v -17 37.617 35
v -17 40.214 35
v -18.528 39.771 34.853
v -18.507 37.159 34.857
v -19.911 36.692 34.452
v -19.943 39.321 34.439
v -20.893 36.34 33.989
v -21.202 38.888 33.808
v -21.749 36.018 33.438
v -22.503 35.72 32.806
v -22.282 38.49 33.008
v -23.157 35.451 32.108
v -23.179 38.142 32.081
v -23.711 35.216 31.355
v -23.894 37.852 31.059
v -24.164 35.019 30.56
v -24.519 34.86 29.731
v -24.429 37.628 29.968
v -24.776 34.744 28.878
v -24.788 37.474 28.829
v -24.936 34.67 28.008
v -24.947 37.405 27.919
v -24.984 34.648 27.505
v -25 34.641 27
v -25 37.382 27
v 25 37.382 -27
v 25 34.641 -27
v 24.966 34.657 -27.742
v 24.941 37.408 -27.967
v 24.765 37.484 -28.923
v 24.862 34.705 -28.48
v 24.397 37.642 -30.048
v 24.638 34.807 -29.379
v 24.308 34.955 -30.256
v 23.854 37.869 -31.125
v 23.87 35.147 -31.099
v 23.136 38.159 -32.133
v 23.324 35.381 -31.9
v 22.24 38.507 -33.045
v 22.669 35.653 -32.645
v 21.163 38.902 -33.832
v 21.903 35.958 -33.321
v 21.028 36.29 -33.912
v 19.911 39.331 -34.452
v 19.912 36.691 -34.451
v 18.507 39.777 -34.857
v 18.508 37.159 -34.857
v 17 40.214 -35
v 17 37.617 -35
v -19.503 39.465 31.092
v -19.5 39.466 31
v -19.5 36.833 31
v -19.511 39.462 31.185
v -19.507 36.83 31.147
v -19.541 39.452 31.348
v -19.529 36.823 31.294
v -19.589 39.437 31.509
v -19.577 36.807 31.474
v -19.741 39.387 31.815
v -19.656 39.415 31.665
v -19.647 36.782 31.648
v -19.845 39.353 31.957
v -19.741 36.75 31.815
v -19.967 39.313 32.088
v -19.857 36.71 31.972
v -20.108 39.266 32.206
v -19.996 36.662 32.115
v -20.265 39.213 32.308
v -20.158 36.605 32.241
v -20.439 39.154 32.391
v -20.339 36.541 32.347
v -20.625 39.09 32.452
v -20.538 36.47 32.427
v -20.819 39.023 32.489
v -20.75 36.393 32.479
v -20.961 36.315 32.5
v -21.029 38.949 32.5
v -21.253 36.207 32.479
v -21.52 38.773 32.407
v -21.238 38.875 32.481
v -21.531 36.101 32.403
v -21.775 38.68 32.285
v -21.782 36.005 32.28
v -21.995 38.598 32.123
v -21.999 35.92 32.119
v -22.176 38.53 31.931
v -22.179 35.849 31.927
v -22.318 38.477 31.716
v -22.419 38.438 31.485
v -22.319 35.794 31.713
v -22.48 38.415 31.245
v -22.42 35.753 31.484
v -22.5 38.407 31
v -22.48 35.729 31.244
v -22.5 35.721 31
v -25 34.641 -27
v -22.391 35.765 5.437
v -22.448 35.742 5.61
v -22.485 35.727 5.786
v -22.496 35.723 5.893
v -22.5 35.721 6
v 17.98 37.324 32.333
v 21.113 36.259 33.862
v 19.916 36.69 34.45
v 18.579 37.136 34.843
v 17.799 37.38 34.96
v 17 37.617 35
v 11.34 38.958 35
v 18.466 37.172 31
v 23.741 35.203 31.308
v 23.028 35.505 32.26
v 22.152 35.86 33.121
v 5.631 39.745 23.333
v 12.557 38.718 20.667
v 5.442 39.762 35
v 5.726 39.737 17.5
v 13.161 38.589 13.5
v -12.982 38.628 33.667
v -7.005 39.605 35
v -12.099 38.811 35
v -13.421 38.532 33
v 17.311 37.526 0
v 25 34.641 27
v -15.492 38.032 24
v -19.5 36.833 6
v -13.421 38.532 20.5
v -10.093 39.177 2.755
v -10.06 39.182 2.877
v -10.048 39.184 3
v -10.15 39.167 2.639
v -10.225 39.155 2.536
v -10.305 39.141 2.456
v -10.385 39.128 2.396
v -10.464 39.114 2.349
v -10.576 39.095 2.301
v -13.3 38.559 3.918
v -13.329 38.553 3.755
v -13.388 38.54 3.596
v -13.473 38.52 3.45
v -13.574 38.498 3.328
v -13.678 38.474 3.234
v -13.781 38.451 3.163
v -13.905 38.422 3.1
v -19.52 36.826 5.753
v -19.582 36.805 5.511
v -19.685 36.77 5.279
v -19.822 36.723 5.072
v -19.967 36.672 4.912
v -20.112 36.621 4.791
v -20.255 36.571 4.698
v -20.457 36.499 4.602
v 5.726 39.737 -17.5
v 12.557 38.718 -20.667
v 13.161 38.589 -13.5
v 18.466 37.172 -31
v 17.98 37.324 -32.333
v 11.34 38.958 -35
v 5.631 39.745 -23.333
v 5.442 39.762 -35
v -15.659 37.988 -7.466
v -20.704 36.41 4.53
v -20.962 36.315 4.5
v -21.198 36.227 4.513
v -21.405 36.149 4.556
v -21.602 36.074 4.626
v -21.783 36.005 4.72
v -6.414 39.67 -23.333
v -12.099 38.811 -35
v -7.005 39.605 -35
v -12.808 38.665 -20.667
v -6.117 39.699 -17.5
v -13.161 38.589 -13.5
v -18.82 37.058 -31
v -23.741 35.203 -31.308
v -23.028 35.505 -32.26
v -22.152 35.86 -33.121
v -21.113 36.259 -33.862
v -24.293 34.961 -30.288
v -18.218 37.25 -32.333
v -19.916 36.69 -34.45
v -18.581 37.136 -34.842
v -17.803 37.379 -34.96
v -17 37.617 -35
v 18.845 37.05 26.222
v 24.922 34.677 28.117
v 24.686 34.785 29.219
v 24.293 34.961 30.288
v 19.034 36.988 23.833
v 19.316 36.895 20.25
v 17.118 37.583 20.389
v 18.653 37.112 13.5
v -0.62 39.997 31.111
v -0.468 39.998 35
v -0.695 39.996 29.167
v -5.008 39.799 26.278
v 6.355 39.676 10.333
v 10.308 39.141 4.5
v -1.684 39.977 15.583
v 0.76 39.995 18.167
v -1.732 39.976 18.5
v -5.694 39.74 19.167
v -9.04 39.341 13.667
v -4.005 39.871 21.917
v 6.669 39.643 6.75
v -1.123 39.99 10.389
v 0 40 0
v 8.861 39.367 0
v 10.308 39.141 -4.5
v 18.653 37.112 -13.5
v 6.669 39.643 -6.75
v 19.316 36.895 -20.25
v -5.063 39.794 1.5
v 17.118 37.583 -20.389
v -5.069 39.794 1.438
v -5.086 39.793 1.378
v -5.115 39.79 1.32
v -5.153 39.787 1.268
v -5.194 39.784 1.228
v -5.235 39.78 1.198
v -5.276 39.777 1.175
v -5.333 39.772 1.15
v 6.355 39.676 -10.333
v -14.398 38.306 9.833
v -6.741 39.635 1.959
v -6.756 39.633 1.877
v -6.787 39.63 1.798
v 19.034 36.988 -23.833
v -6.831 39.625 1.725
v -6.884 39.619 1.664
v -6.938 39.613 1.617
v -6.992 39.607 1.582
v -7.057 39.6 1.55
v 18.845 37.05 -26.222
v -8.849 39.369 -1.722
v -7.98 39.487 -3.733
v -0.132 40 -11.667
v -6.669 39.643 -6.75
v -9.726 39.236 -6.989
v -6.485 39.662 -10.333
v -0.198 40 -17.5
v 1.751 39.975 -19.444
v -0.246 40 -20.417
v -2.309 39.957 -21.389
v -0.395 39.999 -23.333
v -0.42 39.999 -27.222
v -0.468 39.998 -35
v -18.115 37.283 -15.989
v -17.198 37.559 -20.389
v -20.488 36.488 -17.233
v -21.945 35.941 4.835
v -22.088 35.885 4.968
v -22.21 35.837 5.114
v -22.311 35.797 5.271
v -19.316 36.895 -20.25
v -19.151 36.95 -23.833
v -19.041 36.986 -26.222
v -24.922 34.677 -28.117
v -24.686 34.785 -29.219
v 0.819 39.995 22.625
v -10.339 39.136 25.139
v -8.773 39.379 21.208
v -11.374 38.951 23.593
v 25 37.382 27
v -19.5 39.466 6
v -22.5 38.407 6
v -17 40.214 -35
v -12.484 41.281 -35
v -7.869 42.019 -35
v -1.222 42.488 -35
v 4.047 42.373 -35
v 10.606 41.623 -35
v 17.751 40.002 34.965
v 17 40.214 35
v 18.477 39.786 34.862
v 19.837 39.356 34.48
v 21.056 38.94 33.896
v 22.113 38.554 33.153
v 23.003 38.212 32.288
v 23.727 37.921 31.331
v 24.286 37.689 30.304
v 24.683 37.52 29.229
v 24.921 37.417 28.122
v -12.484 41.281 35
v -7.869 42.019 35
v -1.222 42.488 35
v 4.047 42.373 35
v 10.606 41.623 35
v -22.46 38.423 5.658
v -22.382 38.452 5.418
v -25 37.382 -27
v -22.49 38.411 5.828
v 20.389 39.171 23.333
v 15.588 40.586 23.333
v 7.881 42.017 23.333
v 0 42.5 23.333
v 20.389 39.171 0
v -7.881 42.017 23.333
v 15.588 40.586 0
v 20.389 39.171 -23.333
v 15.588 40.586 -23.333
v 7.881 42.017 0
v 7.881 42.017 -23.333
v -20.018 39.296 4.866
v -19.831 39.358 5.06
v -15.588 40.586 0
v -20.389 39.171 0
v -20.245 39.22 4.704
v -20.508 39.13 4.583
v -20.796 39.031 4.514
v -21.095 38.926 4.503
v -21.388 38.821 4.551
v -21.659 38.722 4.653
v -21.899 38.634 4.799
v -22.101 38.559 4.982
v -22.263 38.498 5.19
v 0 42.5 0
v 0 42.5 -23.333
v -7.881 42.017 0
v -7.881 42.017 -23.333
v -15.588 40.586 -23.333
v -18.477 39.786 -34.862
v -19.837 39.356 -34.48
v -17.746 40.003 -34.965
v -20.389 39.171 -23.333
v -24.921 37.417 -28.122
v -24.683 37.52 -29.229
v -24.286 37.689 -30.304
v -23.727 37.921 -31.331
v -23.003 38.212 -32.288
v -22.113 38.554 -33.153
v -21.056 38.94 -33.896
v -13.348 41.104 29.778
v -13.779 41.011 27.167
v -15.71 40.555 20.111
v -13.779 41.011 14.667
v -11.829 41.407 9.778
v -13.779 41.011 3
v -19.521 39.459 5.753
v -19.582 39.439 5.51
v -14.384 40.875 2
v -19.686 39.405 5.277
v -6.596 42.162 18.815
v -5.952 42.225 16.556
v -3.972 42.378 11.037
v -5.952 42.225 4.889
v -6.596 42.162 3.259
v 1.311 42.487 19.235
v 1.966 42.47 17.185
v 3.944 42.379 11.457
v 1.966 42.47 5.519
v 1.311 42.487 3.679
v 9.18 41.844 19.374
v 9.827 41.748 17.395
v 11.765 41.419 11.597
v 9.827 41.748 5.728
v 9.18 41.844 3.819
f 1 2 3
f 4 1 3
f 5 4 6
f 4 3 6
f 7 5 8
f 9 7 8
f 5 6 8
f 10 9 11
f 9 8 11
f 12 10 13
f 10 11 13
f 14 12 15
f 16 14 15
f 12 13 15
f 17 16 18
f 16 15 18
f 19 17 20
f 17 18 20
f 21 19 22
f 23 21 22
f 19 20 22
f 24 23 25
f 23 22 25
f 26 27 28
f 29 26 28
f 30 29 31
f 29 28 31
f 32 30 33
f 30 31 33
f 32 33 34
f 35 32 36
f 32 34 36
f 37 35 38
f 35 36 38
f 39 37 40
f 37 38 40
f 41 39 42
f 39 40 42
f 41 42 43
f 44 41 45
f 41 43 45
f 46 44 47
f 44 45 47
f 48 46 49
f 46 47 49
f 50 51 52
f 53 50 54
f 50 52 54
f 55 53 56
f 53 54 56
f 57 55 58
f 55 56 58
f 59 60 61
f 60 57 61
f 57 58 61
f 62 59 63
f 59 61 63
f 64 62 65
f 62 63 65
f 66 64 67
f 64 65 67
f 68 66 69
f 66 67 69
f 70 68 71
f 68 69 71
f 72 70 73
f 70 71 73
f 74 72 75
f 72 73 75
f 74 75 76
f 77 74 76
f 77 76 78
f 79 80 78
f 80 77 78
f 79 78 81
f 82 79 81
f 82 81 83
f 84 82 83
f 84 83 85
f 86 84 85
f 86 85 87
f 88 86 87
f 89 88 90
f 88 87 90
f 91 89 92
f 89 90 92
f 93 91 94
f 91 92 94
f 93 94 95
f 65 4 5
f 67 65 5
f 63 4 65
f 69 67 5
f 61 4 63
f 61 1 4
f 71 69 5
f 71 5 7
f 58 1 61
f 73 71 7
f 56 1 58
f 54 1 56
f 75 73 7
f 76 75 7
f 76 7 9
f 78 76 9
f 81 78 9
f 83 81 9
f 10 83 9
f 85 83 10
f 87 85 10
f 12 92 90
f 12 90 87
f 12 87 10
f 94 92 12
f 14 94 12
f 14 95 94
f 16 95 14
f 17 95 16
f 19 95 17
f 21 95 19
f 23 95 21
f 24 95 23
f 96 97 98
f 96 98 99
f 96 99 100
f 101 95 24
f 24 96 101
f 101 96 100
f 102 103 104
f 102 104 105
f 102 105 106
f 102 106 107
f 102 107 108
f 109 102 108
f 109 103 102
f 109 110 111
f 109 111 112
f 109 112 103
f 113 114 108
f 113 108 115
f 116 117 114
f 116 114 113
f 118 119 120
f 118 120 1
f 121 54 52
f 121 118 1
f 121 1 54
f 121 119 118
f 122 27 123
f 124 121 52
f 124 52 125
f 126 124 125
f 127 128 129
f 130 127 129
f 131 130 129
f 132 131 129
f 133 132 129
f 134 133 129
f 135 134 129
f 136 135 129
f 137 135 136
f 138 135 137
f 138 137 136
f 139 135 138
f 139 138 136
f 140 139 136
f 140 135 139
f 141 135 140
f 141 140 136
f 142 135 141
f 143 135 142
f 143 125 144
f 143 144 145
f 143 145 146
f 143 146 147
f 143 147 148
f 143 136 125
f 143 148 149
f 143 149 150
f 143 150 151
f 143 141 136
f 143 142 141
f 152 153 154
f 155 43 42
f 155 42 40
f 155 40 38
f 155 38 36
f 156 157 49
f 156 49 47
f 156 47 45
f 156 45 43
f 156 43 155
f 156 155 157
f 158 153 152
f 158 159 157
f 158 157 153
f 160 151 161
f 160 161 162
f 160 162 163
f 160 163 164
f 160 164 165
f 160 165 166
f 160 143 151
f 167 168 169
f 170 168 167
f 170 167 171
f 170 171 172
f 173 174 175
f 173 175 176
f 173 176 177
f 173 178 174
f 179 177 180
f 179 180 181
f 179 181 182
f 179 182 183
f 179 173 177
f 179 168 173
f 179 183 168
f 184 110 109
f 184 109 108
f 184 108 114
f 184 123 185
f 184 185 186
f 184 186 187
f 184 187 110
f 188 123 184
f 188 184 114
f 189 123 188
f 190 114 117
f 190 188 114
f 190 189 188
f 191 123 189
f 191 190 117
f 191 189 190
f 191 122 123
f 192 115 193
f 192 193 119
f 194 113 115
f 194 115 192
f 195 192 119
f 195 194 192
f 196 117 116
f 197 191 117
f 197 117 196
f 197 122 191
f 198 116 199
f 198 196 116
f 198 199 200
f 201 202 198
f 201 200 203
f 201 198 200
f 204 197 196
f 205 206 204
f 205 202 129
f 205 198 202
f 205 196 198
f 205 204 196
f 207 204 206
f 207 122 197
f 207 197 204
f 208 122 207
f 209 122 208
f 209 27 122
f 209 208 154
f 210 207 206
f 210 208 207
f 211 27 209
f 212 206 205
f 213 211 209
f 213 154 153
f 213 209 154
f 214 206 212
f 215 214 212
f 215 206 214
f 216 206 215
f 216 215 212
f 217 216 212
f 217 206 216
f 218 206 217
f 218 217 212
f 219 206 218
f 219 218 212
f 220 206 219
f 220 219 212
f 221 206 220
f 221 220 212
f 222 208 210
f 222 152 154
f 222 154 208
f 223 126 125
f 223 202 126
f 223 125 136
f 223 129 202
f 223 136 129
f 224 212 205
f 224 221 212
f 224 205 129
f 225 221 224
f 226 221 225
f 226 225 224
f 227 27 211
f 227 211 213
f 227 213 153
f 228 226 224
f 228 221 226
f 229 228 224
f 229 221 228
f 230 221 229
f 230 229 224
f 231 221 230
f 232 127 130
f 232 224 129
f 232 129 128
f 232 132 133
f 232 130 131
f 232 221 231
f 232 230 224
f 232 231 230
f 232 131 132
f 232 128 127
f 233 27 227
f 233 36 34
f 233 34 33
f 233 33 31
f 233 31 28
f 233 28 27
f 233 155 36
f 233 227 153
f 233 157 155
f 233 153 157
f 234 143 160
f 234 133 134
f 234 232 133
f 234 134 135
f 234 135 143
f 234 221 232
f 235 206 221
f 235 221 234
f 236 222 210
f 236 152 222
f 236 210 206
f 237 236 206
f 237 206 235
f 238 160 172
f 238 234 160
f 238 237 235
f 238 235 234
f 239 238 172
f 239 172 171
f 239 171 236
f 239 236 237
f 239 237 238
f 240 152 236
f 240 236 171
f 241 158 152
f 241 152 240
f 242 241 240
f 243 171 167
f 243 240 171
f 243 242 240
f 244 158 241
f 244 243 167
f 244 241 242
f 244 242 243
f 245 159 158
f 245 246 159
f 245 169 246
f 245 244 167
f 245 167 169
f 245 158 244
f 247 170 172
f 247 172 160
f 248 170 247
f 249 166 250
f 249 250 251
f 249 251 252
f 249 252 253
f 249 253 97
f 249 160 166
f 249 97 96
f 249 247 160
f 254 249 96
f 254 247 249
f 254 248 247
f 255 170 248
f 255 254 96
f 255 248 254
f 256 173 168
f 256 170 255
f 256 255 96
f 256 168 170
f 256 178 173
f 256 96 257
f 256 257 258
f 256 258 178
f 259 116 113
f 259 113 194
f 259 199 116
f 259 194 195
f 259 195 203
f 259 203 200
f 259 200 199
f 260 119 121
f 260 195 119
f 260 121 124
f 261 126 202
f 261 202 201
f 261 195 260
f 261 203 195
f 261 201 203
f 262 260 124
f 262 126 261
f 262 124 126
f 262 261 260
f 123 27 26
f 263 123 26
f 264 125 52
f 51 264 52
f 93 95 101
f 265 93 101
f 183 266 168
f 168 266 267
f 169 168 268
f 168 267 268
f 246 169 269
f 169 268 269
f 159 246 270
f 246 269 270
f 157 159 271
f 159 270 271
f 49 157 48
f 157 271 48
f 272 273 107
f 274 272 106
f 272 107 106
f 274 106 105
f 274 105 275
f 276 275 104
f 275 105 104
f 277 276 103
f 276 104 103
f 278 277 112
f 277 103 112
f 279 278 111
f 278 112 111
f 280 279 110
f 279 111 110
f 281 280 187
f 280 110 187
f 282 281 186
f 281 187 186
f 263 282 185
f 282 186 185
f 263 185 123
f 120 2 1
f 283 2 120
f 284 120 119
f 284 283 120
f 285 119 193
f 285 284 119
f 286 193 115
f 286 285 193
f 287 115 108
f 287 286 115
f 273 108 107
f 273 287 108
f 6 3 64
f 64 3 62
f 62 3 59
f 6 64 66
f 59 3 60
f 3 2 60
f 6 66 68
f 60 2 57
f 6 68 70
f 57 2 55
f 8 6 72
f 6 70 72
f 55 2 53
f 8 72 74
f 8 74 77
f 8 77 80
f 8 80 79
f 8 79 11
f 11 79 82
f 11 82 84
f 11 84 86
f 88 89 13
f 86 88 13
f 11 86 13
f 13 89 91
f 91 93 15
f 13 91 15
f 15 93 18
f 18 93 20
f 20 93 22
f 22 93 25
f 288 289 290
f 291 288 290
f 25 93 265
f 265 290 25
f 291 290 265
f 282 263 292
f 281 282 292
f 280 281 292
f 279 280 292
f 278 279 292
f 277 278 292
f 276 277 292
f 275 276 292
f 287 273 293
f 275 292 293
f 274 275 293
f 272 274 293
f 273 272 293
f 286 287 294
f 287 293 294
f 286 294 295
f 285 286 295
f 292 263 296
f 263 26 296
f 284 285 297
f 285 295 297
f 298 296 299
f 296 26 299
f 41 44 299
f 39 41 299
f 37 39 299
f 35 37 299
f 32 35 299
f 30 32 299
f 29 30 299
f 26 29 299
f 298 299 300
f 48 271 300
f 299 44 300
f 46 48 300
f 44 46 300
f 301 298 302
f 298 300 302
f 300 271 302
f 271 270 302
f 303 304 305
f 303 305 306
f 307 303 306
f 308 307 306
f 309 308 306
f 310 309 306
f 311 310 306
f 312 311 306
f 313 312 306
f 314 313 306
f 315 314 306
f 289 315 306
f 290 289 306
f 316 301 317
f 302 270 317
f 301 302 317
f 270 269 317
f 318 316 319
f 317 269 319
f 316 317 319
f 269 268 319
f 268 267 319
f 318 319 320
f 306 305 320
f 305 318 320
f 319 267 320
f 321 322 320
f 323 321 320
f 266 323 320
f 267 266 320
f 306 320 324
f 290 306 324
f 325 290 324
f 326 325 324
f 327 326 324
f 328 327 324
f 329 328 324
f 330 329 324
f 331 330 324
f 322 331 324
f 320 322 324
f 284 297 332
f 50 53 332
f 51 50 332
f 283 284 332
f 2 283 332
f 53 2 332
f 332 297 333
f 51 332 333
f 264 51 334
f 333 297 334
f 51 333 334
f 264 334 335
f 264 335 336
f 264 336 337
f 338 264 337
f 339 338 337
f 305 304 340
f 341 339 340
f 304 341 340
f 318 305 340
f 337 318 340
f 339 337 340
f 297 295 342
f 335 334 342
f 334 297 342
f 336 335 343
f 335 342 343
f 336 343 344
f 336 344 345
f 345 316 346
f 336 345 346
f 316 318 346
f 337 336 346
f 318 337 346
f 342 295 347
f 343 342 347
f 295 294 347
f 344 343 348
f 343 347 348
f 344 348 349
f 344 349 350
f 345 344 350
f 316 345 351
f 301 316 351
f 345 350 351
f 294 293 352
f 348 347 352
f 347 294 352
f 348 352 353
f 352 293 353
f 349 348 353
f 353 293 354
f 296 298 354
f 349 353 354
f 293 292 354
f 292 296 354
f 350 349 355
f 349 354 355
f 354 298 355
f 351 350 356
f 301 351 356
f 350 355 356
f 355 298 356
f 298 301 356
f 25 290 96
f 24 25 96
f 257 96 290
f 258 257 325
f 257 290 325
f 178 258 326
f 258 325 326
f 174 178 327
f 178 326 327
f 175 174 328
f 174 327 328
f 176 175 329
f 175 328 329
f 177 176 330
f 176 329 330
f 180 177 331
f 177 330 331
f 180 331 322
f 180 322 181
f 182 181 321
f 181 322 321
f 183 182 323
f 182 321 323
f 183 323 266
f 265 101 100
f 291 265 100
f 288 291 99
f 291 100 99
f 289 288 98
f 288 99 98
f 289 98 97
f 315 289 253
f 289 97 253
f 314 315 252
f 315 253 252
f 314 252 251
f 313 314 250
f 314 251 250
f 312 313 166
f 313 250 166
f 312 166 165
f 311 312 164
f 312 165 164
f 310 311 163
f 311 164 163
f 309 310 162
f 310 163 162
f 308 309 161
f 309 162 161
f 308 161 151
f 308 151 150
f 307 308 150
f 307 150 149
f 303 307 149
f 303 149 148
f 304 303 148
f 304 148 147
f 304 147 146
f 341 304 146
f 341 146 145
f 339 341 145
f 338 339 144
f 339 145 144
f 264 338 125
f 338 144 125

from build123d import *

# Parameters (mm, degrees)
BOSS_EXTRUDE1_START = -35
BOSS_EXTRUDE1_DEPTH = 70
CUT_EXTRUDE1_DEPTH  = 61.466933282
FILLET1_R           = 8


# Read off the part's stored shape, not the designer's step: Boss-Extrude1
with BuildPart() as part:
    # Boss-Extrude1 outline → Boss-Extrude1 (new body)
    with BuildSketch(Plane.XY.offset(BOSS_EXTRUDE1_START)):
        with BuildLine():
            Line((25, 34.641016151), (25, 37.382028889))
            add(Edge.make_bspline(
                [(25, 37.382028889), (23.499149868, 38.038900322), (20.42020332, 39.233525172), (12.247727699, 41.641473317), (0, 43.149082804), (-12.247727699, 41.641473317), (-20.42020332, 39.233525172), (-23.499149868, 38.038900322), (-25, 37.382028889)],
                knots=[1.070195568, 1.070195568, 1.070195568, 1.070195568, 1.168370339, 1.266545109, 1.570796327, 1.875047544, 1.973222315, 2.071397085, 2.071397085, 2.071397085, 2.071397085], degree=3))
            Line((-25, 37.382028889), (-25, 34.641016151))
            add(Edge.make_bspline(
                [(25, 34.641016151), (0, 46.188021535), (-25, 34.641016151)],
                knots=[1.047197551, 1.047197551, 1.047197551, 2.094395102, 2.094395102, 2.094395102], degree=2, weights=[1, 0.866025404, 1]))
        make_face()
    extrude(amount=BOSS_EXTRUDE1_DEPTH)

    # Sketch5 → Cut-Extrude1 (cut, through all)
    with BuildSketch(Plane(origin=(0, 0, 0), x_dir=(1, 0, 0), z_dir=(0, 1, 0))):
        with BuildLine():
            Line((-22.5, -31), (-22.5, -6))
            ThreePointArc((-22.5, -6), (-21, -4.5), (-19.5, -6))
            Line((-19.5, -6), (-19.5, -31))
            ThreePointArc((-19.5, -31), (-21, -32.5), (-22.5, -31))
        make_face()
    extrude(amount=CUT_EXTRUDE1_DEPTH, mode=Mode.SUBTRACT)

    # Fillet1
    # the kernel refuses this fillet: 8 mm, written as the material it takes off along each edge
    with BuildSketch(Plane(origin=(-25, 57.382028889, -35), x_dir=(0, 0, 1), z_dir=(0, -1, 0)), Plane(origin=(-25, 57.382028889, 35), x_dir=(1, 0, 0), z_dir=(0, -1, 0)), Plane(origin=(25, 14.641016151, -35), x_dir=(0, 0, 1), z_dir=(0, 1, 0))) as fillet1_piece_1:
        with BuildLine():
            CenterArc((FILLET1_R, -FILLET1_R), FILLET1_R, 90, 90)
            Line((0, -FILLET1_R), (0, 0))
            Line((0, 0), (FILLET1_R, 0))
        make_face()
    extrude(amount=42.741012738, mode=Mode.SUBTRACT)
    with BuildSketch(Plane(origin=(25, 14.641016151, 35), x_dir=(0, 0, -1), z_dir=(0, 1, 0))) as fillet1_piece_2:
        with BuildLine():
            CenterArc((FILLET1_R, FILLET1_R), FILLET1_R, 180, 90)
            Line((0, FILLET1_R), (0, 0))
            Line((0, 0), (FILLET1_R, 0))
        make_face()
    extrude(amount=42.741012738, mode=Mode.SUBTRACT)


solid = part.part
